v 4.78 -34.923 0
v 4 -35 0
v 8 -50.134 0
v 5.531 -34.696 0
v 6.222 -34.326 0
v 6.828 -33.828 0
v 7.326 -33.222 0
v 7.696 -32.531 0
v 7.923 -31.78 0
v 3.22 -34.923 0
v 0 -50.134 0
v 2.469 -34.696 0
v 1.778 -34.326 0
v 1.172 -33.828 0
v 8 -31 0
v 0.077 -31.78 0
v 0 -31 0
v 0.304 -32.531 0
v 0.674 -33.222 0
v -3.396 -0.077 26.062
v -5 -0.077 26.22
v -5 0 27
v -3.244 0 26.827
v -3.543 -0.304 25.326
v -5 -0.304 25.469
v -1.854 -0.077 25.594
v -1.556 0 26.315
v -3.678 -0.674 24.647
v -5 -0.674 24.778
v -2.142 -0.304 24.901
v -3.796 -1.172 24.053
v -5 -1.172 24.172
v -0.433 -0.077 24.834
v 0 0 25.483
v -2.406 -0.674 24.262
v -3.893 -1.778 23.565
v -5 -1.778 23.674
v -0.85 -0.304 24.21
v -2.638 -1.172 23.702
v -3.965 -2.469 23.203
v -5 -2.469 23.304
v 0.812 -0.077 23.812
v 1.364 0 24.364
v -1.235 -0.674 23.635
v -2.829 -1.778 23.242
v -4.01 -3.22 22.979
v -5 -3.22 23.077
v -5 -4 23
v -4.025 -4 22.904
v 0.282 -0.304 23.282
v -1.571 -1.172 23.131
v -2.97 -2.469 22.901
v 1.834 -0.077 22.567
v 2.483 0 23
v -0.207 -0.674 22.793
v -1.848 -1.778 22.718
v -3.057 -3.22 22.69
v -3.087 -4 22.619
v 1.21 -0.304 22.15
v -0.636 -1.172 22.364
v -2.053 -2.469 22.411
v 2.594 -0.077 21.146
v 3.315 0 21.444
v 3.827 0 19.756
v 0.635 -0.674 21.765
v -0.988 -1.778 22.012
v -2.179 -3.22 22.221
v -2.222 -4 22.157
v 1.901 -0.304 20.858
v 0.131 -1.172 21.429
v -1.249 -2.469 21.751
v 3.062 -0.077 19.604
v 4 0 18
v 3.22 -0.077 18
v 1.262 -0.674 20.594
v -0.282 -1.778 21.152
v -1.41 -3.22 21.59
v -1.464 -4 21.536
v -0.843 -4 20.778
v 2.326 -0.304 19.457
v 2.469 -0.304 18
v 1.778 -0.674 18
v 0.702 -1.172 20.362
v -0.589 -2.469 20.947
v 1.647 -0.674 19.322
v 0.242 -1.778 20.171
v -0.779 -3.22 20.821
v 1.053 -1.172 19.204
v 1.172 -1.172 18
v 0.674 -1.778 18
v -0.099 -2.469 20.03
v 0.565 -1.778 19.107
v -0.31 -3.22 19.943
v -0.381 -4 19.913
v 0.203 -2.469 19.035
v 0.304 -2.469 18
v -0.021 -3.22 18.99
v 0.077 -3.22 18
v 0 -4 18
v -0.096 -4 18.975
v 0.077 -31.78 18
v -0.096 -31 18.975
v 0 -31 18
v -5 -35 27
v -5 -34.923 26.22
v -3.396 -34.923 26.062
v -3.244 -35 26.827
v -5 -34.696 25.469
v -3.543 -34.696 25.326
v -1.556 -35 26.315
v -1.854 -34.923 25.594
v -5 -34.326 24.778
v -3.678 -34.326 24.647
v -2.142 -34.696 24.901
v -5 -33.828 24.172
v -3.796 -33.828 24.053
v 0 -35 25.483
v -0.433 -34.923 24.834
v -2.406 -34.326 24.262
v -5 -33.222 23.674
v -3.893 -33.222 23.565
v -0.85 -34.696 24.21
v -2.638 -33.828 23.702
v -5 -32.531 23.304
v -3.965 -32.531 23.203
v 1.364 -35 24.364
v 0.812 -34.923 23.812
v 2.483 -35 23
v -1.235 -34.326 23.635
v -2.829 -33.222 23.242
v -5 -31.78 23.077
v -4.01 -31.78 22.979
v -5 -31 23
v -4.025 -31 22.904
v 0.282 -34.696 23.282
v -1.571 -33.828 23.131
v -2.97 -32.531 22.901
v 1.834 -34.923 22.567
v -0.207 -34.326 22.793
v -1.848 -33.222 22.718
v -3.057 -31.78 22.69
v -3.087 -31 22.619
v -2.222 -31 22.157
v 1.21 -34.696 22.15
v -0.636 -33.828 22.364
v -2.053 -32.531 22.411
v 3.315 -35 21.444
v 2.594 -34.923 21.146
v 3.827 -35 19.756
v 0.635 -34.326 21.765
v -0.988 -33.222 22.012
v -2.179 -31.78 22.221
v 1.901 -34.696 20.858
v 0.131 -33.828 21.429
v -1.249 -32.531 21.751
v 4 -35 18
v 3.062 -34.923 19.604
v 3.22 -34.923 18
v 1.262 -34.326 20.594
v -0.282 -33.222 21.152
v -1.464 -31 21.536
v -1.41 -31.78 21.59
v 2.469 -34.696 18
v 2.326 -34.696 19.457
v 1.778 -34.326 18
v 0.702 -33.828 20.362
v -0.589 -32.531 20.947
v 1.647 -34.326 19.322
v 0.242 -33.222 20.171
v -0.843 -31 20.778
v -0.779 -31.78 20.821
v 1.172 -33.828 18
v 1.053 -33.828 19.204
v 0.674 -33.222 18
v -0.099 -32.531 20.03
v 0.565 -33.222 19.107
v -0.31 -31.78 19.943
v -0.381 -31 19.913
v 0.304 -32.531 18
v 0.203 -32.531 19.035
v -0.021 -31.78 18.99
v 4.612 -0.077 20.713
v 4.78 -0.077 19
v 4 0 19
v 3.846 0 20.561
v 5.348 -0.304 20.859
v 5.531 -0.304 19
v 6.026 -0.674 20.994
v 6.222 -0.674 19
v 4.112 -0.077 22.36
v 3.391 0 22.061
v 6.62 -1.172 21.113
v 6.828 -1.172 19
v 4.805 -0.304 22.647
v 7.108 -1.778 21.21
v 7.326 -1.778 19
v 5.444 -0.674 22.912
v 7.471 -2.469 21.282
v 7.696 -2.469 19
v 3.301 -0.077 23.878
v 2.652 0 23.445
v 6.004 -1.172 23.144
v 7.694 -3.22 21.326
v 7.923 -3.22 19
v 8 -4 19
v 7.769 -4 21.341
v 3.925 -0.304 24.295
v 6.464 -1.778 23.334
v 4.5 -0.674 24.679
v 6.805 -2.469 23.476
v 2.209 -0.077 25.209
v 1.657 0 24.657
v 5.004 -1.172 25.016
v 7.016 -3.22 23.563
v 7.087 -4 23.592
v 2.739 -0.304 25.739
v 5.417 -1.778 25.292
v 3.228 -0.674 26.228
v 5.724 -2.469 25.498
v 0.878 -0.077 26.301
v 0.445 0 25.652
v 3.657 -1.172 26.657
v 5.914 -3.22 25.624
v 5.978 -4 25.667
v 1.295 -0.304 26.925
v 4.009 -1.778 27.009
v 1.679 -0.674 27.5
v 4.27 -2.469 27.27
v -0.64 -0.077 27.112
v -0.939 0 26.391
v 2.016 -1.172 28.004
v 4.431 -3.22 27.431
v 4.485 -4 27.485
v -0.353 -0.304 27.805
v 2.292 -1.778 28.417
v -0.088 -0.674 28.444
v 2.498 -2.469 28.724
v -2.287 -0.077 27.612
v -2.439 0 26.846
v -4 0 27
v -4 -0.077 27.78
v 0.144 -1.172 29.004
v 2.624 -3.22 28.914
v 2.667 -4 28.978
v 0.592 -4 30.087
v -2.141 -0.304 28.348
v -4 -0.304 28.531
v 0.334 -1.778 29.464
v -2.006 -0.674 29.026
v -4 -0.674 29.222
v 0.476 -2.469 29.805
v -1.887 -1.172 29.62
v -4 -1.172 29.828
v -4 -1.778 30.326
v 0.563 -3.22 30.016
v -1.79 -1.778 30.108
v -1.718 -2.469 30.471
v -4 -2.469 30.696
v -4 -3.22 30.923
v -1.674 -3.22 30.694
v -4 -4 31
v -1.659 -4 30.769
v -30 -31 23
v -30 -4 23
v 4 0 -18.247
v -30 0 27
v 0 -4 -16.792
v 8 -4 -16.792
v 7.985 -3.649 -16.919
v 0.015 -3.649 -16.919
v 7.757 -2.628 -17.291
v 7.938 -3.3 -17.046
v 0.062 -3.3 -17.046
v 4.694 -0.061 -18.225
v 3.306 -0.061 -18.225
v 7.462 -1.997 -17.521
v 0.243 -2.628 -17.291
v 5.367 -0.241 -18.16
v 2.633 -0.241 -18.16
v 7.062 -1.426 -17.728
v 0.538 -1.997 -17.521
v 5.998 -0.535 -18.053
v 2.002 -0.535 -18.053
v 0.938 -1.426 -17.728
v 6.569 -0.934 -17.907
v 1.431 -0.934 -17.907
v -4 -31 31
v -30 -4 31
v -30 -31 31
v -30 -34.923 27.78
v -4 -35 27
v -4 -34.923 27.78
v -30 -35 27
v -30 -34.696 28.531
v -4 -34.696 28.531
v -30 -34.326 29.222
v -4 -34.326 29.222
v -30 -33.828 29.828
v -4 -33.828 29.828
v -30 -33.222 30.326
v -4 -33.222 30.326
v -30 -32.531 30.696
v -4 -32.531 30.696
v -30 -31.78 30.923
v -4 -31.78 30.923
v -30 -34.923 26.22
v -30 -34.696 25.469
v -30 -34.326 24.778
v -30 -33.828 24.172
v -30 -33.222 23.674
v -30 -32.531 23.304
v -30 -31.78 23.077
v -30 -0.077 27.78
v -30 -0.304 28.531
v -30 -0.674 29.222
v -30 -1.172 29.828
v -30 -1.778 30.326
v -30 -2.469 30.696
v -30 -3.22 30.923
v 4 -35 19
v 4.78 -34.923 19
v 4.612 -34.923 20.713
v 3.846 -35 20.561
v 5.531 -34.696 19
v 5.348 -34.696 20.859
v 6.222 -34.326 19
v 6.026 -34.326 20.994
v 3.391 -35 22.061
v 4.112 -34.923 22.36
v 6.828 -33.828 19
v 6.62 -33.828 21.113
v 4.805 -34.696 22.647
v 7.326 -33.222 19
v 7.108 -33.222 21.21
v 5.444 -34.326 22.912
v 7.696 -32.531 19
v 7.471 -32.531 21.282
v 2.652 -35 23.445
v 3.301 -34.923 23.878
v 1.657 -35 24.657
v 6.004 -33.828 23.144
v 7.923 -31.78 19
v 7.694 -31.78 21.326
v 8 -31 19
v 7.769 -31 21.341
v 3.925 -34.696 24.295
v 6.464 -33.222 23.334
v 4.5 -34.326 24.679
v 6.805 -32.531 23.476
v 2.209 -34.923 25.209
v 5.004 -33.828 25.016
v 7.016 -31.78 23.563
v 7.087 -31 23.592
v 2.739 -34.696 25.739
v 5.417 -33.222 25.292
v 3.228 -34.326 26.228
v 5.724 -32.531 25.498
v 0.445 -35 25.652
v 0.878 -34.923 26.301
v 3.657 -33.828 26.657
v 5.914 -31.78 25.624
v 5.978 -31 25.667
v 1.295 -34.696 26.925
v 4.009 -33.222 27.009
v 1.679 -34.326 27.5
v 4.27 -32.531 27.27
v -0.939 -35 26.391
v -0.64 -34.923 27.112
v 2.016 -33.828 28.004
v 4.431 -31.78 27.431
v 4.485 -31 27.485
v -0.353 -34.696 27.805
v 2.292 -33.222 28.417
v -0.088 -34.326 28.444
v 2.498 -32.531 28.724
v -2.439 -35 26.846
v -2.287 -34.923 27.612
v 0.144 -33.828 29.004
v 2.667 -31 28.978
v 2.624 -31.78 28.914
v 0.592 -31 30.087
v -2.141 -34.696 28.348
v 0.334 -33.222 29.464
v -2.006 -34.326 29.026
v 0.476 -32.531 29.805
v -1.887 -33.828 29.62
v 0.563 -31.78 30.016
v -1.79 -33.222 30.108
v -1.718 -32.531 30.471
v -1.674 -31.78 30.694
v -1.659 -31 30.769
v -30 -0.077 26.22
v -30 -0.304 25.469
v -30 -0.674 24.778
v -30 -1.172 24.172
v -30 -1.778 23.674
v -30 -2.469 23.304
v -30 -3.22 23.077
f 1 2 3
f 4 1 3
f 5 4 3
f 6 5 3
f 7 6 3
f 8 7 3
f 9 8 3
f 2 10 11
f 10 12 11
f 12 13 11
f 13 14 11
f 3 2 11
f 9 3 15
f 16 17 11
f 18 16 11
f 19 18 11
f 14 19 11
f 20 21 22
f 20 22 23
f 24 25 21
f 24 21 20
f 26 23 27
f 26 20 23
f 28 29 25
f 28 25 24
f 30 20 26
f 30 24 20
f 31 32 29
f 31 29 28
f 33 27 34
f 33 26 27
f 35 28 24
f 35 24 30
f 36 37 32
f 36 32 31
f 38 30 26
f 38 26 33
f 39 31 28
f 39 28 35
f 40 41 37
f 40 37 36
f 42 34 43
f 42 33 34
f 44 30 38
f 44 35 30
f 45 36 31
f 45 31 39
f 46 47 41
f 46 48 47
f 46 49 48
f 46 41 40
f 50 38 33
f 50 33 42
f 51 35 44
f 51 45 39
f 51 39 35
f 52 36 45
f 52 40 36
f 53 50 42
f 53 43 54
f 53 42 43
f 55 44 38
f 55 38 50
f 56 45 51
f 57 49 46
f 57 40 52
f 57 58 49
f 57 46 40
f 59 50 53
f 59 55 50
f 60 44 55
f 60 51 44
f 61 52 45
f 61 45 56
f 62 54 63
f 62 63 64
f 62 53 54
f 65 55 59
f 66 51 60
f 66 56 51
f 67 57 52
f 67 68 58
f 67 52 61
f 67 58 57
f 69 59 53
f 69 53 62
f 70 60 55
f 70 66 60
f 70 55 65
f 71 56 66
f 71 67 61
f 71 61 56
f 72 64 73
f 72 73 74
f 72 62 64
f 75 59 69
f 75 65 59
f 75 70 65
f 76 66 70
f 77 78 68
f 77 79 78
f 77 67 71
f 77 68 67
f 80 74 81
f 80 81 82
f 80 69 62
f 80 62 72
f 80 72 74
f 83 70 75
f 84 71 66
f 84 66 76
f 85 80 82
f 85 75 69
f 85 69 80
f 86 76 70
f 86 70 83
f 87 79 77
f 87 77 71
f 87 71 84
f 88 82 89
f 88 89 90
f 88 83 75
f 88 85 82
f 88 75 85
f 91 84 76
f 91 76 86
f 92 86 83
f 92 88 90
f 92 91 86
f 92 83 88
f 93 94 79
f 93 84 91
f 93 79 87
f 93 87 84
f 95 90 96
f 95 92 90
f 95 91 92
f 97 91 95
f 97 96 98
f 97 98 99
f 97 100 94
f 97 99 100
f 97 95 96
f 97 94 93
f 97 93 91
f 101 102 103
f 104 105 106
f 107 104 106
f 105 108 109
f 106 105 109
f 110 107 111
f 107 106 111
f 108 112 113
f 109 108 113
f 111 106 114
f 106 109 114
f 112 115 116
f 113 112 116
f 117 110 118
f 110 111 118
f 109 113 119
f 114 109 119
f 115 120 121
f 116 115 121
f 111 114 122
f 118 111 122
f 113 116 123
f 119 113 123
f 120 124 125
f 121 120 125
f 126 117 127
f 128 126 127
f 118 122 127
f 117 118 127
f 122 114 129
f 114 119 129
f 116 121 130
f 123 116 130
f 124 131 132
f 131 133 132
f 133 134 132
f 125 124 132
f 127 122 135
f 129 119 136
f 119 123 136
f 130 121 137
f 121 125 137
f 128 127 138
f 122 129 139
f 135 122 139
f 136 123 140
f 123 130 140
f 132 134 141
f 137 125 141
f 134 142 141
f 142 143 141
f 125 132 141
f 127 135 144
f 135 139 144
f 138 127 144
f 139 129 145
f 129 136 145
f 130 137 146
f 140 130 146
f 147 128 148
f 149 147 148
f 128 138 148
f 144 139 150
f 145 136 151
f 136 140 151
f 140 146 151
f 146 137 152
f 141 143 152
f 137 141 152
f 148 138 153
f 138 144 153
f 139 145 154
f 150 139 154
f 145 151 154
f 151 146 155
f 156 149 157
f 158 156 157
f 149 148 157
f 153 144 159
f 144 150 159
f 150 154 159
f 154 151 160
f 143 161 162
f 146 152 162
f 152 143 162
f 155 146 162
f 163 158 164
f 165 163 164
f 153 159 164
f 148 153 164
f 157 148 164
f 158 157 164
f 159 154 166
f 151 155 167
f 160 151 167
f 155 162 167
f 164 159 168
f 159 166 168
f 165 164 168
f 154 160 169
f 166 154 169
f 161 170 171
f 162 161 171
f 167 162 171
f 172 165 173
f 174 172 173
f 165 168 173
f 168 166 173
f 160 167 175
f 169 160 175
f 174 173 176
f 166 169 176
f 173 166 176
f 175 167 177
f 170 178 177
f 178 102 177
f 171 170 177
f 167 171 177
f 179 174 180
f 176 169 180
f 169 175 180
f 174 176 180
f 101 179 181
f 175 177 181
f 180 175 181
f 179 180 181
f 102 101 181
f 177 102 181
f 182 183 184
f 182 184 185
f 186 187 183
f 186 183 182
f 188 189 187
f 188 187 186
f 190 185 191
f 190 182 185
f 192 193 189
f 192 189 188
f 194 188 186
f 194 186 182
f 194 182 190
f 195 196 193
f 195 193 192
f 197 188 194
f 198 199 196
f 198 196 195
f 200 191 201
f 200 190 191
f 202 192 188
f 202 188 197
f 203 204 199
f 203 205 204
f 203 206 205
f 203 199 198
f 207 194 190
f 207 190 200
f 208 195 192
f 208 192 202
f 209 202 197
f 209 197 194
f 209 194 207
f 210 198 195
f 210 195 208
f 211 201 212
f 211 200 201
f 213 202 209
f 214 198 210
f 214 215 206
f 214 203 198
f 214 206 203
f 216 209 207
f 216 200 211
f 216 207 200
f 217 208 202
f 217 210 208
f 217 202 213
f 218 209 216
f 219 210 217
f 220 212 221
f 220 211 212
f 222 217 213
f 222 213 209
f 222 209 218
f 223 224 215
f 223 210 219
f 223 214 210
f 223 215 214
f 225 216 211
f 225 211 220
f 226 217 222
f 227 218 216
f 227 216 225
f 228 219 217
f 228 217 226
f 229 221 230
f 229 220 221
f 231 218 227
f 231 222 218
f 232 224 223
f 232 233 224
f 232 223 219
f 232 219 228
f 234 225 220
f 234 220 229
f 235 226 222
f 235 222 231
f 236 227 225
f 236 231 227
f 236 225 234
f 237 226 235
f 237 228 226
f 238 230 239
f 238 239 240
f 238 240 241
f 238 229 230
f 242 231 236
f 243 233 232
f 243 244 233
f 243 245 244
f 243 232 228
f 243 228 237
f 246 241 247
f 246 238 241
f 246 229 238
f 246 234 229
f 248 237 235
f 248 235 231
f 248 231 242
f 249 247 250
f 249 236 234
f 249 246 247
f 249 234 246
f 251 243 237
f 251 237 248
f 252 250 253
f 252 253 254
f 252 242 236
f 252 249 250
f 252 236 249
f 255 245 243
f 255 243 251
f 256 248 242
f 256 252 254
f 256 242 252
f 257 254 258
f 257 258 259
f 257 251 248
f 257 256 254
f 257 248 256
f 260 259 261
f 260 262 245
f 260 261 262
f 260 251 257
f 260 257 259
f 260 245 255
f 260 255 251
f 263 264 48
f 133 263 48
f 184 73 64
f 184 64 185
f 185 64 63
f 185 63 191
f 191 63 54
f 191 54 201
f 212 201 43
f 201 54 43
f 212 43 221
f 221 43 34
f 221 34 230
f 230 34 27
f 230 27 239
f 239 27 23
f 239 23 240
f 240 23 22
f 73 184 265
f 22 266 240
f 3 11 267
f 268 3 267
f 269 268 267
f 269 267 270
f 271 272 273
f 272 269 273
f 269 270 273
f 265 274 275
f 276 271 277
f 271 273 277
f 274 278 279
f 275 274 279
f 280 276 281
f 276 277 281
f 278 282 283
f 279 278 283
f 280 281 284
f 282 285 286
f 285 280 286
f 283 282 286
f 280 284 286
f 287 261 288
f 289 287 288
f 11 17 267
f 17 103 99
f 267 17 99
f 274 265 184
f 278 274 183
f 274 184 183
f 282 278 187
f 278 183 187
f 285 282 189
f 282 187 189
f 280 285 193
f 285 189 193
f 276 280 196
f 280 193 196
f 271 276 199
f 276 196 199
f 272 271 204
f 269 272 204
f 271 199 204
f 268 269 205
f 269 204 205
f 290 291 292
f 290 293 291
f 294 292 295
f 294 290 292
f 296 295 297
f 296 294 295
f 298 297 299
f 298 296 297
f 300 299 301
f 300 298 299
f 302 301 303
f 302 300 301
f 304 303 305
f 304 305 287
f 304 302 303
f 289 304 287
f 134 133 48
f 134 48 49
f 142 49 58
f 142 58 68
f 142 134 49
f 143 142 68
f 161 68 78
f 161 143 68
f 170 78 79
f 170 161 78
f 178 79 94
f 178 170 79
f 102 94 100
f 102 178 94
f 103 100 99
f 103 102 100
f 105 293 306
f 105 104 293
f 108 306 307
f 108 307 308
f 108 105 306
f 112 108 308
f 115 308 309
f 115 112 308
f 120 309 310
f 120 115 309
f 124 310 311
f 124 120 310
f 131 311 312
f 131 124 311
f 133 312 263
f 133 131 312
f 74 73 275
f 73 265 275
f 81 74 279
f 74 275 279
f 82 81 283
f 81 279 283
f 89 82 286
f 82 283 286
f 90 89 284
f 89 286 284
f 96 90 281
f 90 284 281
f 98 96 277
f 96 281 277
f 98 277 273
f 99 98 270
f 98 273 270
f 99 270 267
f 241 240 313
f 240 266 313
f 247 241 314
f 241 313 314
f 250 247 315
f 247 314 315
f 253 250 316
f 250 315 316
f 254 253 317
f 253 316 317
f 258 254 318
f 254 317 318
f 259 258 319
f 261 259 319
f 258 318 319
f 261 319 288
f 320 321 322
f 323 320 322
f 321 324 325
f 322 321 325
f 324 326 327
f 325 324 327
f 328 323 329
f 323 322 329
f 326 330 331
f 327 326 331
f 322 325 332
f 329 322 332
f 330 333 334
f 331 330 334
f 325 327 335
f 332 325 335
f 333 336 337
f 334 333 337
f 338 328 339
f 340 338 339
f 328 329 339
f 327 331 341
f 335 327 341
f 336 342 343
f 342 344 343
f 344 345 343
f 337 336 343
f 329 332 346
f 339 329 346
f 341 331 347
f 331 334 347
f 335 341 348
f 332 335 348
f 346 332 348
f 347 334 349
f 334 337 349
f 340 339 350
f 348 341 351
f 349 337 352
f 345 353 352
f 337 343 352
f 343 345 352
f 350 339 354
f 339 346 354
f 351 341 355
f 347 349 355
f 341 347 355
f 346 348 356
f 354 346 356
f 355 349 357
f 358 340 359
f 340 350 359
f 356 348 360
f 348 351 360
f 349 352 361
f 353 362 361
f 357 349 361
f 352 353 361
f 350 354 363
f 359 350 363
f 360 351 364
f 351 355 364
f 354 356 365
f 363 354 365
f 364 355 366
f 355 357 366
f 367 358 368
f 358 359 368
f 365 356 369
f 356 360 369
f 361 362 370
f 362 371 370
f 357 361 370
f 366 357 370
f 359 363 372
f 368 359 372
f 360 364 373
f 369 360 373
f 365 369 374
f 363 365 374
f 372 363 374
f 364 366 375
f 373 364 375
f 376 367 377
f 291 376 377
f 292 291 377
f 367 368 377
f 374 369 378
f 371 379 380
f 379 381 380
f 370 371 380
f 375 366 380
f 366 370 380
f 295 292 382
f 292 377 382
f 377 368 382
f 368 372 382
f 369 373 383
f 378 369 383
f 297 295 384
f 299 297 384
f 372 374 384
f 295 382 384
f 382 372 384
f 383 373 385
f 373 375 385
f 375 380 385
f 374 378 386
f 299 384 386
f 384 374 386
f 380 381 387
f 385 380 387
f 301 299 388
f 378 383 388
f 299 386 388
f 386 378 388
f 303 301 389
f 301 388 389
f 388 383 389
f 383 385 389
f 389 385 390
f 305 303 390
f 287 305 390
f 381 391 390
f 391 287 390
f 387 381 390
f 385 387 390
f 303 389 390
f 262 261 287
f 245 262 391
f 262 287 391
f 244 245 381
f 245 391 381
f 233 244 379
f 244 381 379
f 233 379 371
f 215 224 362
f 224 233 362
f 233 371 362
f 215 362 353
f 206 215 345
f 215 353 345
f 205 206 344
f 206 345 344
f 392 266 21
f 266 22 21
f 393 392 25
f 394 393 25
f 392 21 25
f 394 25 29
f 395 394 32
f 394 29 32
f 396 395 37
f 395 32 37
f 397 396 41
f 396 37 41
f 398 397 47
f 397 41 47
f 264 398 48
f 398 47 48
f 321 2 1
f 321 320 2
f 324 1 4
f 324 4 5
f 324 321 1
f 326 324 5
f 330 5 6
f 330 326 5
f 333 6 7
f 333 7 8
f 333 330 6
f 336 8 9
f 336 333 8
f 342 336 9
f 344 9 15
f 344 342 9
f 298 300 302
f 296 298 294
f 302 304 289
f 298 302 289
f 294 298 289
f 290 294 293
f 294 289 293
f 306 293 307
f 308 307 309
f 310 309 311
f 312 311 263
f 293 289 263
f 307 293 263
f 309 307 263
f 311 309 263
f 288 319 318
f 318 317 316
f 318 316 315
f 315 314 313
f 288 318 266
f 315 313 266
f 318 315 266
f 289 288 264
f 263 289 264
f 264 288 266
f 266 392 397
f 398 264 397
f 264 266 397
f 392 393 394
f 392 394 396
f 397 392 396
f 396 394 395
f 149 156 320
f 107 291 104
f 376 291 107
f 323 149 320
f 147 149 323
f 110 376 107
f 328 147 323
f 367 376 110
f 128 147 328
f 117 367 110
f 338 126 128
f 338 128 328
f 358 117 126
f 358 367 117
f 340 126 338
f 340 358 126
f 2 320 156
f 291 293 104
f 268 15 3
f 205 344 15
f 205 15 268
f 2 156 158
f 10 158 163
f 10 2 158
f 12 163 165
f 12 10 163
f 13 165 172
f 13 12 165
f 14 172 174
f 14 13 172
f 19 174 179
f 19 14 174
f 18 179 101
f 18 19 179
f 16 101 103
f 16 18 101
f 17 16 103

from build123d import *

# Parameters (mm, degrees)
F1_DEPTH = 35
F3_DEPTH = 8
F4_R     = 5
F5_R     = 12
F6_R     = 3.99999
F7_R     = 3.99999


# Not quite as in the source:
# - a fillet or chamfer is up to 0.001 mm smaller than in the source, because OpenCascade refuses the exact size


with BuildPart() as f1:
    # F0 (on Front) → F1 (new body)
    with BuildSketch(Plane.XZ):
        Polygon((-30, 31), (-30, 23), (0, 23), (0, 0), (8, 0), (8, 31), align=None)
    extrude(amount=F1_DEPTH)

    # F2 (on Right) → F3 (join)
    with BuildSketch(Plane.YZ):
        Polygon((0, 0), (-50.1344501972, 0), (0, -18.2474475831), align=None)
    extrude(amount=F3_DEPTH)

    # F4
    f4_edges = [f1.edges().sort_by_distance(p)[0] for p in [
        (0, -17.5, 23),
    ]]
    fillet(f4_edges, radius=F4_R)

    # F5
    f5_edges = [f1.edges().sort_by_distance(p)[0] for p in [
        (8, -17.5, 31),
    ]]
    fillet(f5_edges, radius=F5_R)

    # F6 (radius 4 in the source; OpenCascade refuses exactly that, so slightly less here)
    f6_edges = [f1.edges().sort_by_distance(p)[0] for p in [
        (-17, -35, 31),
        (-17.5, -35, 23),
        (4.485281, -35, 27.485281),
        (-1.464466, -35, 21.535534),
        (0, -35, 9),
        (8, -35, 9.5),
    ]]
    fillet(f6_edges, radius=F6_R)

    # F7 (radius 4 in the source; OpenCascade refuses exactly that, so slightly less here)
    f7_edges = [f1.edges().sort_by_distance(p)[0] for p in [
        (-17, 0, 31),
        (-17.5, 0, 23),
        (0, 0, -0.123724),
        (8, 0, 0.376276),
        (4.485281, 0, 27.485281),
        (-1.464466, 0, 21.535534),
    ]]
    fillet(f7_edges, radius=F7_R)


solid = f1.part
